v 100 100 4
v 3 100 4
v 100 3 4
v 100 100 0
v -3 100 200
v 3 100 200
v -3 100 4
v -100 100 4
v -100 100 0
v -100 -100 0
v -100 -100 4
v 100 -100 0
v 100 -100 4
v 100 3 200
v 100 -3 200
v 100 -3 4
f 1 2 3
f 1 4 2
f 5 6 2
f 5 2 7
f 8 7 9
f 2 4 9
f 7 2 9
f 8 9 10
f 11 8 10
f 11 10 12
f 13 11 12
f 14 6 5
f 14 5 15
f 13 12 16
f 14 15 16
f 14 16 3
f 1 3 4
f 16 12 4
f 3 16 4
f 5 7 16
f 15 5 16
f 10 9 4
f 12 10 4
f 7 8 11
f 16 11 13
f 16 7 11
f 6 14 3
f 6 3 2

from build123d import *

# Parameters (mm, degrees)
SZKIC1_W                    = 100
SZKIC1_H                    = 100
DODANIE_WYCI_GNI_CIE1_DEPTH = 4
DODANIE_WYCI_GNI_CIE4_DEPTH = 196


with BuildPart() as part:
    # Szkic1 → Dodanie-wyciągnięcie1 (new body)
    with BuildSketch(Plane.XY):
        with Locations((-50, 50)):
            Rectangle(SZKIC1_W, SZKIC1_H)
        with Locations((50, 50)):
            Rectangle(SZKIC1_W, SZKIC1_H)
        with Locations((50, -50)):
            Rectangle(SZKIC1_W, SZKIC1_H)
        with Locations((-50, -50)):
            Rectangle(SZKIC1_W, SZKIC1_H)
    extrude(amount=DODANIE_WYCI_GNI_CIE1_DEPTH)

    # Szkic2 → Dodanie-wyciągnięcie4 (add)
    with BuildSketch(Plane.XY.offset(4)):
        Polygon((3, 100), (0, 100), (-3, 100), (100, -3), (100, 0), (100, 3), align=None)
    extrude(amount=DODANIE_WYCI_GNI_CIE4_DEPTH)


solid = part.part
